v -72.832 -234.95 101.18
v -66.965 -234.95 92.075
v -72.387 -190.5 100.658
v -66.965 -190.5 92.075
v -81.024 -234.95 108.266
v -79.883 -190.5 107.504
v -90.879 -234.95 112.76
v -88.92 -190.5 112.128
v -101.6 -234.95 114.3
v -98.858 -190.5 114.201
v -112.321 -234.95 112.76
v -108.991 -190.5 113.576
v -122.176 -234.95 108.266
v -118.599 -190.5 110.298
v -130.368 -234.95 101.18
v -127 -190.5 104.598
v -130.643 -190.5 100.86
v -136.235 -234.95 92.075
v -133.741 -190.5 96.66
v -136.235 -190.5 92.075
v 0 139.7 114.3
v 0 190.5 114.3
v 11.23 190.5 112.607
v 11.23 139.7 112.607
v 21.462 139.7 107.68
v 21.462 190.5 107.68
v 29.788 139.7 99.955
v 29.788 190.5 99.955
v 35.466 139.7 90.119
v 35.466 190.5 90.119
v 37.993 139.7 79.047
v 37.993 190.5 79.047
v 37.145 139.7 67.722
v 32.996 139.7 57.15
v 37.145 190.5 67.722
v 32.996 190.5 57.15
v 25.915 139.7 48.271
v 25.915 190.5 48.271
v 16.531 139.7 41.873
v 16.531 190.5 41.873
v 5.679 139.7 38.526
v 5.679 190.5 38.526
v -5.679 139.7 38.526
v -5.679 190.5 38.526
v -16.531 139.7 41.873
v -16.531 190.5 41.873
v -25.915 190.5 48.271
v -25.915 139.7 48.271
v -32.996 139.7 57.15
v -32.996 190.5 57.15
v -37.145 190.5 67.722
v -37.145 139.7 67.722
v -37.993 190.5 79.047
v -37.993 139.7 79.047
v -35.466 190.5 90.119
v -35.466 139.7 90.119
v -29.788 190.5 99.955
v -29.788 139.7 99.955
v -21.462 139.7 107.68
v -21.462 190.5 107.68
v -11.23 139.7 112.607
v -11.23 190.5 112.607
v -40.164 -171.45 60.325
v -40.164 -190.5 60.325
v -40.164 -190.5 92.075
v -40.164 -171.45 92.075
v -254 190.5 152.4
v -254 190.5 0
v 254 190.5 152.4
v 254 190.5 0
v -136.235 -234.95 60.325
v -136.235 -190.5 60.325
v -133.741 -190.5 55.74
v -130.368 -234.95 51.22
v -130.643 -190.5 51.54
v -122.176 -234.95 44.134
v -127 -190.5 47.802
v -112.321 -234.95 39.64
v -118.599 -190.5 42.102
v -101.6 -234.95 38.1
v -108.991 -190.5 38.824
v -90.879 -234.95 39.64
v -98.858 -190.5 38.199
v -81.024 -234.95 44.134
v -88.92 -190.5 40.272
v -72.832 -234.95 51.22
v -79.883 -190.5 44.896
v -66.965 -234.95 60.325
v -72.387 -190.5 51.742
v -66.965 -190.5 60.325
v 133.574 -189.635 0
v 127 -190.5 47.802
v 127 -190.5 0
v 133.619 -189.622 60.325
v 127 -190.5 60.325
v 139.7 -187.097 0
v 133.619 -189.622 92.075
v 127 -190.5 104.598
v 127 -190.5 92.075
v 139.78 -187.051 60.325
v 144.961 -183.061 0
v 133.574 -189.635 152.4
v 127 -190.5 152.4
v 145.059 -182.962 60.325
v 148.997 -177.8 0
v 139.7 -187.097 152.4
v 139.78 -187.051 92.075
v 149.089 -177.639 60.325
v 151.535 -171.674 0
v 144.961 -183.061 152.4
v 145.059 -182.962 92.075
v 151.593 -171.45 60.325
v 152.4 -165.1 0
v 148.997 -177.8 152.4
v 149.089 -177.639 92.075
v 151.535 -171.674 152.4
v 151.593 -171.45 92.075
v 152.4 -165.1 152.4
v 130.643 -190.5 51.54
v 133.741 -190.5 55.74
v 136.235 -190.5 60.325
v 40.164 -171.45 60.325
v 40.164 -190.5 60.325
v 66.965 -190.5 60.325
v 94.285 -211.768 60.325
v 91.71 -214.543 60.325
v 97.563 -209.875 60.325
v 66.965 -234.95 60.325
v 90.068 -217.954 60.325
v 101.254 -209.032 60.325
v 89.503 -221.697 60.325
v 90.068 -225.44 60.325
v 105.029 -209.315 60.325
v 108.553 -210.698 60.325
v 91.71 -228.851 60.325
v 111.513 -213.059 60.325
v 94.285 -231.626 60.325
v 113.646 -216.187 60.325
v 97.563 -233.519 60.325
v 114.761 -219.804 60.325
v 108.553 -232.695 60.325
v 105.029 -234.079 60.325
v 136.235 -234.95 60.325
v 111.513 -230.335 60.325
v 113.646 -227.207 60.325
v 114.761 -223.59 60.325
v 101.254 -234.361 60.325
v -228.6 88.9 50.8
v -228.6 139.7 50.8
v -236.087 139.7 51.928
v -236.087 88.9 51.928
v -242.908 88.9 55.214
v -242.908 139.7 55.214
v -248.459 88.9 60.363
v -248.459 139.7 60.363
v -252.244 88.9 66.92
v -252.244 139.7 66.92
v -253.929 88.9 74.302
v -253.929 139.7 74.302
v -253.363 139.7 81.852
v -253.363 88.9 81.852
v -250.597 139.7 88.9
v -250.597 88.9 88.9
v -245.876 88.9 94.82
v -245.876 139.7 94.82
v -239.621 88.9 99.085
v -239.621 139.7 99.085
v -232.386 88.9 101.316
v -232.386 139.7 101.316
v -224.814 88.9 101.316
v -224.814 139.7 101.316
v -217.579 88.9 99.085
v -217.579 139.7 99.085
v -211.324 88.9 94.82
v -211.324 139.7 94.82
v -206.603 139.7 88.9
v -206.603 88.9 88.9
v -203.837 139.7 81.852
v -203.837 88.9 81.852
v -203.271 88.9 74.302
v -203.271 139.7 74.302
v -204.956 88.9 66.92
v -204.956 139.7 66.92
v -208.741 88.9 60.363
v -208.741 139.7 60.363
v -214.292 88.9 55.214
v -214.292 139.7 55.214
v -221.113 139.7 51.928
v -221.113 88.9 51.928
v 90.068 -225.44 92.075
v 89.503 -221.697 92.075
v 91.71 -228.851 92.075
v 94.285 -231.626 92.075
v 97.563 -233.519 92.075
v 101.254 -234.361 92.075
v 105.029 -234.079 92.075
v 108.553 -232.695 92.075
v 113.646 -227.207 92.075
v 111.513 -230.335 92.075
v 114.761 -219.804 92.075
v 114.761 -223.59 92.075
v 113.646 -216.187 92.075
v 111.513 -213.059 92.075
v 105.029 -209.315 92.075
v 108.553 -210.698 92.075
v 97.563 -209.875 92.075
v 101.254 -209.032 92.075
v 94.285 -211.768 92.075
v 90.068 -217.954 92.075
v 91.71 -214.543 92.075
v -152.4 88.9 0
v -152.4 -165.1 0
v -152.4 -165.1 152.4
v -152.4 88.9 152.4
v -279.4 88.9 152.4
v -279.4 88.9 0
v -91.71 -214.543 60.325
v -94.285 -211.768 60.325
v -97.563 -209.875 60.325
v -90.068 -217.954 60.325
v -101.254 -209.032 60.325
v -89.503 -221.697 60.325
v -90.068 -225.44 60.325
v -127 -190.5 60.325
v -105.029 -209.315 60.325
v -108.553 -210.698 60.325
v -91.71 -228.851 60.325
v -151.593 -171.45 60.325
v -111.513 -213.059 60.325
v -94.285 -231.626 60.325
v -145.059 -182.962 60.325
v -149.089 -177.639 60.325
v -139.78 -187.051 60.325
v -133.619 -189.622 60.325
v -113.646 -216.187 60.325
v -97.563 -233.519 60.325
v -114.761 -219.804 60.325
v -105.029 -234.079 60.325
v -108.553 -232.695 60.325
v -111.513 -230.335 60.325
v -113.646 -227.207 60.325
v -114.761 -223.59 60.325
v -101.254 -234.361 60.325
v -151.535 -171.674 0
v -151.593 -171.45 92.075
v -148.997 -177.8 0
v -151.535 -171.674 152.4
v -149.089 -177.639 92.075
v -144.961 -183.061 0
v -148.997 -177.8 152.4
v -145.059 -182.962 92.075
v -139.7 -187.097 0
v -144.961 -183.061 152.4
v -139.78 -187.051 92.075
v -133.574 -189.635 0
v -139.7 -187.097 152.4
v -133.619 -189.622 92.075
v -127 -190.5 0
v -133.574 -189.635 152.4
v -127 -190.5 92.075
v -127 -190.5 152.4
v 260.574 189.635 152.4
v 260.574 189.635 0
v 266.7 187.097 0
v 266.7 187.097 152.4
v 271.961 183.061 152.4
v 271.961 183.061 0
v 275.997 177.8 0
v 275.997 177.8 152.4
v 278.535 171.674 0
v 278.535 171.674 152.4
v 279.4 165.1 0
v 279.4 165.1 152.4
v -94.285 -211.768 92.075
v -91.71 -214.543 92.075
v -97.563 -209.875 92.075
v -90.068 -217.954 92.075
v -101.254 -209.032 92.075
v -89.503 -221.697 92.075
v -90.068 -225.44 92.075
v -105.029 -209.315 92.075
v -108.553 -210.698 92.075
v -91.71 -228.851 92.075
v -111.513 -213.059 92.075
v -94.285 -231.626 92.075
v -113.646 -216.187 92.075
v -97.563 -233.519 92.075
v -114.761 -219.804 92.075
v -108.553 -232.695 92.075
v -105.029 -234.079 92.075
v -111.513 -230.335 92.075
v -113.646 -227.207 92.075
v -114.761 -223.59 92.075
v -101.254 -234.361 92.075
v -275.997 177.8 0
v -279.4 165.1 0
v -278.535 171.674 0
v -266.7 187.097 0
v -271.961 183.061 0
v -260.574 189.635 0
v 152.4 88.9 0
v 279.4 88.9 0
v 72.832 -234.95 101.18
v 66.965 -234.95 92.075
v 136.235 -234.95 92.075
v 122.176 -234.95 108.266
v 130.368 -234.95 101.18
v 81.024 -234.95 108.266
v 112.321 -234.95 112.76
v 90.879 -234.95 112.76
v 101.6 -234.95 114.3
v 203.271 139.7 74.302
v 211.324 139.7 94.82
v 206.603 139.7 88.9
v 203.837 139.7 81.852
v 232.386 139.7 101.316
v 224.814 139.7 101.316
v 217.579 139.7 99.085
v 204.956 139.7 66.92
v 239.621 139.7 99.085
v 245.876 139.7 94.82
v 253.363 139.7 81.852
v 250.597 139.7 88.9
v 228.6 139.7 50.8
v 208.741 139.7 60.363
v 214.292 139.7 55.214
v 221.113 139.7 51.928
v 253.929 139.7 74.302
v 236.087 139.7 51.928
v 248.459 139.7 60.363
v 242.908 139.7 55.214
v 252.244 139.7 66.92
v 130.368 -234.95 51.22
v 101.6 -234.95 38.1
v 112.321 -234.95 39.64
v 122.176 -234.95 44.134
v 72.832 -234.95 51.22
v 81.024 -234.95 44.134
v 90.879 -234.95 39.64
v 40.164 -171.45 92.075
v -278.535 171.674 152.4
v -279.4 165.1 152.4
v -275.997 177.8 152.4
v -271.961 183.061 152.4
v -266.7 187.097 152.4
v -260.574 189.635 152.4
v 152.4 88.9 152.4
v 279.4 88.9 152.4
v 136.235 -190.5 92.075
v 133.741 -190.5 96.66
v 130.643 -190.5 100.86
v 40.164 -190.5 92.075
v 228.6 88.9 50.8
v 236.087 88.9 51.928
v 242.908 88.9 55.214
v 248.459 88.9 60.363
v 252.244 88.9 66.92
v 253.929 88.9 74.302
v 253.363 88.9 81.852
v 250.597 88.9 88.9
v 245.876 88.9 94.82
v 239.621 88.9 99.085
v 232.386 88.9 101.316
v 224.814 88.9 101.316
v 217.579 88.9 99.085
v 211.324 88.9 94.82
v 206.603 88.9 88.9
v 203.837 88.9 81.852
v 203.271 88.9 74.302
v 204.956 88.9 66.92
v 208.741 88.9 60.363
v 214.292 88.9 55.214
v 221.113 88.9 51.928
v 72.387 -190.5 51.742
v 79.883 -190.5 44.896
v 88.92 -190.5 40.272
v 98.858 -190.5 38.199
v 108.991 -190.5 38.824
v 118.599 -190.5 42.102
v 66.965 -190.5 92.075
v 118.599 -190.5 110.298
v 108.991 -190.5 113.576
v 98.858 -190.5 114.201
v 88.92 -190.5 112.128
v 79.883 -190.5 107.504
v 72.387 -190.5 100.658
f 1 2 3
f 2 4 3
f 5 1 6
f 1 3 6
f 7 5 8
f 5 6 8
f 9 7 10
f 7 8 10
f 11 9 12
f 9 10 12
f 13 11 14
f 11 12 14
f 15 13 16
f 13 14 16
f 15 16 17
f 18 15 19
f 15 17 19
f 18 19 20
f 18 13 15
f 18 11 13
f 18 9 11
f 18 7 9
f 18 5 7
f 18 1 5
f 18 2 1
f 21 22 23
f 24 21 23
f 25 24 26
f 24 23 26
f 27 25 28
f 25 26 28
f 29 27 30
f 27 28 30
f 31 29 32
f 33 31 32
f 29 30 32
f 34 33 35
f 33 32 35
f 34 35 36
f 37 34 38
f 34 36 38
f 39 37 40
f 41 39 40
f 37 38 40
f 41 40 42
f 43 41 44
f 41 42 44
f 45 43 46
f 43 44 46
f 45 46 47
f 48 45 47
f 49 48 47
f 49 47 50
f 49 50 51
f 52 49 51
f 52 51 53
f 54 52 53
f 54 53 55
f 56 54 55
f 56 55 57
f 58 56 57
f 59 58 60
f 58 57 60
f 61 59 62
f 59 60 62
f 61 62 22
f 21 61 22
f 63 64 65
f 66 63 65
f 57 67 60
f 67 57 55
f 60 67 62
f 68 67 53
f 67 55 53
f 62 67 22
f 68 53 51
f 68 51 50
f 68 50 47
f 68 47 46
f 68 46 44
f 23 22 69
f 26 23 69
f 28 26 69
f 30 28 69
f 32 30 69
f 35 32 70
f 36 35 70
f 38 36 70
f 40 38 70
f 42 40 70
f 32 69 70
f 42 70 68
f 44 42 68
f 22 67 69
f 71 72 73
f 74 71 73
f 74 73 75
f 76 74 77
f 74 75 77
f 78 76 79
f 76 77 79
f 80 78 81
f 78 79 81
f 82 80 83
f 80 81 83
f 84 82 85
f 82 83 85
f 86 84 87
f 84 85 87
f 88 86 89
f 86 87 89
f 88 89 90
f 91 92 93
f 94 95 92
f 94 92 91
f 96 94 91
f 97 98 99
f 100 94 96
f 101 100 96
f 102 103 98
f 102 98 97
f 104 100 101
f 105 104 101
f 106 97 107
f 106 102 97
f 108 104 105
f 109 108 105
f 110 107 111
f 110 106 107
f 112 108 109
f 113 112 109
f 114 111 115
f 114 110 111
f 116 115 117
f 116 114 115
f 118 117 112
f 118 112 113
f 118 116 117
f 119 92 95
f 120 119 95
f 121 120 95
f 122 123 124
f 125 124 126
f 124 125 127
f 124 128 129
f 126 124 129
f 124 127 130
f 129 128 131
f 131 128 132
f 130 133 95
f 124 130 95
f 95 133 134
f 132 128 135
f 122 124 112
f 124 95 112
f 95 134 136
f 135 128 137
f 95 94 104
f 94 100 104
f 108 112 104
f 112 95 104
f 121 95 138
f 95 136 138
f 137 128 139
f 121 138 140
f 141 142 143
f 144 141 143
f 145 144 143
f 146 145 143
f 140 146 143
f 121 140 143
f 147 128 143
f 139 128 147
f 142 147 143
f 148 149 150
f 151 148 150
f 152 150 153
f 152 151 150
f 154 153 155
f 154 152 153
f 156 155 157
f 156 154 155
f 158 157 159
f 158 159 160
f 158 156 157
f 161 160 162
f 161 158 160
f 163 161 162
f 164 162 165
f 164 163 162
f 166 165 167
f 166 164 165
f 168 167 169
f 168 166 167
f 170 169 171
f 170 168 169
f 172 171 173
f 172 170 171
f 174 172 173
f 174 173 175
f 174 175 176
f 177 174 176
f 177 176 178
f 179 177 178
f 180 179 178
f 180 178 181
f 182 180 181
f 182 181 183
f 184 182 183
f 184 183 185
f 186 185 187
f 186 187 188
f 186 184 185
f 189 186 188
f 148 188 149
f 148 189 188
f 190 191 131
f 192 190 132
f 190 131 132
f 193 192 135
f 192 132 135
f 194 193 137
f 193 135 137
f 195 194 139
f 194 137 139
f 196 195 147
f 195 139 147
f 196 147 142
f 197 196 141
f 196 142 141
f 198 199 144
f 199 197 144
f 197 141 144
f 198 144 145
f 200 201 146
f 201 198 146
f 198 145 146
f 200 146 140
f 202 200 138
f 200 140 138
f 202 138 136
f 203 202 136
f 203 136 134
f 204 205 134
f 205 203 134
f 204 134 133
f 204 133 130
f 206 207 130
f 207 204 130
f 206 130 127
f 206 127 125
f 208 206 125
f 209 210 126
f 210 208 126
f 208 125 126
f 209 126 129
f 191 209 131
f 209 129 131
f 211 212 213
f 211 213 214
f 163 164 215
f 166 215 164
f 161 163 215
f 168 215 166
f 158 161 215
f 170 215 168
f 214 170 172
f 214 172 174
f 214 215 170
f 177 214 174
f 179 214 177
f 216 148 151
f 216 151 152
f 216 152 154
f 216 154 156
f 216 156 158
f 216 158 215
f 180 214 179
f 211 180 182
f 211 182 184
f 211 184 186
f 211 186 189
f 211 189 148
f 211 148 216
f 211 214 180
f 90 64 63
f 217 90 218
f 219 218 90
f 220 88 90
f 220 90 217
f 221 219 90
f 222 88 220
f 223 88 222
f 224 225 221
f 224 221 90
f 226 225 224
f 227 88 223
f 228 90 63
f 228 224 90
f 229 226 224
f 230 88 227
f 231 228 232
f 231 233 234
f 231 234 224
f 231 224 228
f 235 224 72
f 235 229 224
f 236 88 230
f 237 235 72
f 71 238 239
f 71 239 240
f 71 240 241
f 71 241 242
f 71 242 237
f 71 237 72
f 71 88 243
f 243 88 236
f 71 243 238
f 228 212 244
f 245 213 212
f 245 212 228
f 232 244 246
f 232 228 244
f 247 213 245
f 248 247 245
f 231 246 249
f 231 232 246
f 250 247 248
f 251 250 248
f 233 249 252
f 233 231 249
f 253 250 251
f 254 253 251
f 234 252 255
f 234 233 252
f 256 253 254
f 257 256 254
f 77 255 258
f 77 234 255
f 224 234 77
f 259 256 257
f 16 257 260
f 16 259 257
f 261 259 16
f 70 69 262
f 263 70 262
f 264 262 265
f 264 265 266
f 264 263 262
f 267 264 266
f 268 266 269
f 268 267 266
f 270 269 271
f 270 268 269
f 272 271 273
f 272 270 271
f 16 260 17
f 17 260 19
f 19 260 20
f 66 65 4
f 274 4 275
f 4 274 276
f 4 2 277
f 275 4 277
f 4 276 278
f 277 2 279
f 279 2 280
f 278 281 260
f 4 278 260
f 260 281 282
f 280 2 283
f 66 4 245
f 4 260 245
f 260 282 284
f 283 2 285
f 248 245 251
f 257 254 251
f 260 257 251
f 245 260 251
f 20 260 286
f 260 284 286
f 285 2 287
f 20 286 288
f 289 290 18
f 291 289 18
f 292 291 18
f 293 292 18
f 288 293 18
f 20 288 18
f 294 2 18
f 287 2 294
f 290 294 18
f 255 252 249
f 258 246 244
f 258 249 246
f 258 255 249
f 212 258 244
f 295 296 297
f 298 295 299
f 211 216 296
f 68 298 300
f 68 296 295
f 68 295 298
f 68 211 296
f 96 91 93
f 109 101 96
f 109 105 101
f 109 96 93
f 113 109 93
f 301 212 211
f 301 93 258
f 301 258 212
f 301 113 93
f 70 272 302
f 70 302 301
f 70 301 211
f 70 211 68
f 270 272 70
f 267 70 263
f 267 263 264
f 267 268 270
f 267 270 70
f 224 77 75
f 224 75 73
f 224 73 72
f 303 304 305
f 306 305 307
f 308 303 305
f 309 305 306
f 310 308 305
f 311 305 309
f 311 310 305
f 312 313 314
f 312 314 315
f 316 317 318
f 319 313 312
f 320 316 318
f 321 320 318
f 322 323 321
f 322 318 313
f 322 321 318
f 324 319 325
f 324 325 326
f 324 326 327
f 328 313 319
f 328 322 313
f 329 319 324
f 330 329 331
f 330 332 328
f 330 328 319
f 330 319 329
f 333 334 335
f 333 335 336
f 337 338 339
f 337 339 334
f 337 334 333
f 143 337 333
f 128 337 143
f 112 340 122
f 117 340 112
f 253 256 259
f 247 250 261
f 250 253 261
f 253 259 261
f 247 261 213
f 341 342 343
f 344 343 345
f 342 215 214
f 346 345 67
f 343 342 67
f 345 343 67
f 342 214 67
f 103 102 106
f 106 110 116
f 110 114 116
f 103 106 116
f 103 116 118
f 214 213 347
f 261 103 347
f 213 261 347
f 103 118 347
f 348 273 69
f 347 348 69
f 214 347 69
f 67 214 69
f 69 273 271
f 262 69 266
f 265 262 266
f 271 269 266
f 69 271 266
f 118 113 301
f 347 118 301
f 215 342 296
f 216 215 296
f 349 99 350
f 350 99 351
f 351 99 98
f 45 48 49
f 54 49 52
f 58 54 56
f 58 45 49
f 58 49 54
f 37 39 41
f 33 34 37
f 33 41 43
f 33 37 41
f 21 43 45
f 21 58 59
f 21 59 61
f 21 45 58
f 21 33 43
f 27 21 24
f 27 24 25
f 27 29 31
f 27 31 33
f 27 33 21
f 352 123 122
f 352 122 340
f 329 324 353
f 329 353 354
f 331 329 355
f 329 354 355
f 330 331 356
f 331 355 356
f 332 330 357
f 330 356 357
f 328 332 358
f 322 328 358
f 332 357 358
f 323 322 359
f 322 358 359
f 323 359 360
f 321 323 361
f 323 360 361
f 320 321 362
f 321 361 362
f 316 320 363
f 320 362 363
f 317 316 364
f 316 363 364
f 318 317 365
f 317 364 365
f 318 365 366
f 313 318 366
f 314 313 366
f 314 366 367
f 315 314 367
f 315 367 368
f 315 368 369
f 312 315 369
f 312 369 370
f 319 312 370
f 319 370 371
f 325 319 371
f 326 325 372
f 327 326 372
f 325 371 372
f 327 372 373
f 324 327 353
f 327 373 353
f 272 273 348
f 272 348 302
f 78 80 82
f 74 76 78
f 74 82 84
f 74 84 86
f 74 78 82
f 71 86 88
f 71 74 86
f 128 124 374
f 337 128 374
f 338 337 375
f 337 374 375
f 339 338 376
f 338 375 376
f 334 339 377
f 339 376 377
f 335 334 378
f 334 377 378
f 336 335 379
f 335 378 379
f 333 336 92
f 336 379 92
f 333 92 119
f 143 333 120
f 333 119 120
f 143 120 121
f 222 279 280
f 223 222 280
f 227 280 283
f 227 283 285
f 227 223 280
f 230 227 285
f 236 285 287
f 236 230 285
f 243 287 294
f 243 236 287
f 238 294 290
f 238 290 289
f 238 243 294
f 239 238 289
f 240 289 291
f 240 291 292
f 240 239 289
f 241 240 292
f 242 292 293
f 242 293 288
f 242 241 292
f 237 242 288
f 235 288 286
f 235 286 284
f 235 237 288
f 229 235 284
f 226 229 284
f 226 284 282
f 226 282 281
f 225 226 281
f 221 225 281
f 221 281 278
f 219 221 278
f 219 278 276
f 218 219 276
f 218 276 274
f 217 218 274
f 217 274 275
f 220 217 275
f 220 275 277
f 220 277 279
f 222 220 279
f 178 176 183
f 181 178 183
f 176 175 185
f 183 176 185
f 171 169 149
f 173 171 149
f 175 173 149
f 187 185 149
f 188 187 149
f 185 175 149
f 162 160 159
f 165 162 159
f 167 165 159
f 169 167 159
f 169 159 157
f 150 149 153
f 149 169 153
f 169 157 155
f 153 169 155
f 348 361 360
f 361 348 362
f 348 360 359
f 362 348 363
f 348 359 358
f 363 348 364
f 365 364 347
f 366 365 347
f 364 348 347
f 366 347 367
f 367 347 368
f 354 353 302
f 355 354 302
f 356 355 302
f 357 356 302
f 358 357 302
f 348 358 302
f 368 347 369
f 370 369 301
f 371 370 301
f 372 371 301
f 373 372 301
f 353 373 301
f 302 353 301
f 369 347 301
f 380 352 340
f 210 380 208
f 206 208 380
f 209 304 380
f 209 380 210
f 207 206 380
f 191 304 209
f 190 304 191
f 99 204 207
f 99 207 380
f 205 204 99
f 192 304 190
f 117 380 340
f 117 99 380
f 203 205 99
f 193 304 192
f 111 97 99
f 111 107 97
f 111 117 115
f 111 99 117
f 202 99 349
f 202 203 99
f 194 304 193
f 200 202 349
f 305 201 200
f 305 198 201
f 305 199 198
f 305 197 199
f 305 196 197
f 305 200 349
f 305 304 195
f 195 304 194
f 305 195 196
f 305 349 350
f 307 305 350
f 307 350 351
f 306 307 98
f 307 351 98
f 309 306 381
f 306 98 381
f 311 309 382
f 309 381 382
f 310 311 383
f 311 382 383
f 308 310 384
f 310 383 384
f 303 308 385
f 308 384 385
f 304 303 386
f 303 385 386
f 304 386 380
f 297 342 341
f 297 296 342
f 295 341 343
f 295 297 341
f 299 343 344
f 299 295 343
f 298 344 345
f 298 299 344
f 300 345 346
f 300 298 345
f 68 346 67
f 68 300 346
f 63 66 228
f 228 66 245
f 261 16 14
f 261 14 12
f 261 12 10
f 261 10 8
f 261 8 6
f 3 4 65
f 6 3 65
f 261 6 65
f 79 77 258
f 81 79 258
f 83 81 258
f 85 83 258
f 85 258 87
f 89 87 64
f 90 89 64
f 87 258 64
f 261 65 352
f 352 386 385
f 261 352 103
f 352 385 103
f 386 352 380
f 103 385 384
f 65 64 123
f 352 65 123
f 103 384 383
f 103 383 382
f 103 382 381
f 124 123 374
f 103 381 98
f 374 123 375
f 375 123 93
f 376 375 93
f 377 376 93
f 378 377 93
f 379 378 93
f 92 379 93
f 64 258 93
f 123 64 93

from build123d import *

# Parameters (mm, degrees)
SKETCH1_W           = 304.8
SKETCH1_H           = 381
BOSS_EXTRUDE1_DEPTH = 152.4
SKETCH2_R           = 38.1
CUT_EXTRUDE1_DEPTH  = 50.8
SKETCH5_W           = 152.4
SKETCH5_H           = 101.6
BOSS_EXTRUDE3_DEPTH = 127
SKETCH6_R           = 25.4
CUT_EXTRUDE4_DEPTH  = 50.8
FILLET4_R           = 25.4
FILLET5_R           = 25.4
SKETCH3_R           = 38.1
BOSS_EXTRUDE4_DEPTH = 44.45
SKETCH8_W           = 122.871403684
SKETCH8_H           = 31.75
CUT_EXTRUDE5_DEPTH  = 63.5
SKETCH9_R           = 12.7
BOSS_EXTRUDE5_DEPTH = 32.766


with BuildPart() as part:
    # Sketch1 → Boss-Extrude1 (new body)
    with BuildSketch(Plane.XY):
        Rectangle(SKETCH1_W, SKETCH1_H)
    extrude(amount=BOSS_EXTRUDE1_DEPTH)

    # Sketch2 → Cut-Extrude1 (cut)
    with BuildSketch(Plane(origin=(0, 190.5, 0), x_dir=(1, 0, 0), z_dir=(0, 1, 0))):
        with Locations(Location((0, -76.2, 0), (0, 0, 270))):
            Circle(SKETCH2_R)
    extrude(amount=-CUT_EXTRUDE1_DEPTH, mode=Mode.SUBTRACT)

    # Sketch5 → Boss-Extrude3 (add)
    with BuildSketch(Plane(origin=(152.4, 0, 0), x_dir=(0, 0, -1), z_dir=(1, 0, 0))):
        with Locations((-76.2, 139.7)):
            Rectangle(SKETCH5_W, SKETCH5_H)
    boss_extrude3 = extrude(amount=BOSS_EXTRUDE3_DEPTH)

    # Mirror1: Boss-Extrude3 across plane
    add(boss_extrude3.mirror(Plane(origin=(0, 0, 0), x_dir=(0, 0, 1), z_dir=(1, 0, 0))))

    # Sketch6 → Cut-Extrude4 (cut)
    with BuildSketch(Plane.XZ.offset(-88.9)):
        with Locations(Location((228.6, 76.2, 0), (0, 0, 270))):
            Circle(SKETCH6_R)
    cut_extrude4 = extrude(amount=-CUT_EXTRUDE4_DEPTH, mode=Mode.SUBTRACT)

    # Fillet4
    fillet4_edges = [part.edges().sort_by_distance(p)[0] for p in [
        (279.4, 190.5, 76.2),
        (-279.4, 190.5, 76.2),
    ]]
    fillet(fillet4_edges, radius=FILLET4_R)

    # Fillet5
    fillet5_edges = [part.edges().sort_by_distance(p)[0] for p in [
        (-152.4, -190.5, 76.2),
        (152.4, -190.5, 76.2),
    ]]
    fillet(fillet5_edges, radius=FILLET5_R)

    # Mirror2: Cut-Extrude4 across plane
    add(cut_extrude4.mirror(Plane(origin=(0, 0, 0), x_dir=(0, 0, 1), z_dir=(1, 0, 0))), mode=Mode.SUBTRACT)

    # Sketch3 → Boss-Extrude4 (add)
    with BuildSketch(Plane.XZ.offset(190.5)):
        with Locations(Location((-101.6, 76.2, 0), (0, 0, 131.810314896))):
            Circle(SKETCH3_R)
        with Locations(Location((101.6, 76.2, 0), (0, 0, 48.189685104))):
            Circle(SKETCH3_R)
    extrude(amount=BOSS_EXTRUDE4_DEPTH)

    # Sketch8 → Cut-Extrude5 (cut)
    with BuildSketch(Plane.XZ.offset(234.95)):
        with Locations((101.6, 76.2)):
            Rectangle(SKETCH8_W, SKETCH8_H)
    cut_extrude5 = extrude(amount=-CUT_EXTRUDE5_DEPTH, mode=Mode.SUBTRACT)

    # Mirror3: Cut-Extrude5 across plane
    add(cut_extrude5.mirror(Plane(origin=(0, 0, 0), x_dir=(0, 0, 1), z_dir=(1, 0, 0))), mode=Mode.SUBTRACT)

    # Sketch9 → Boss-Extrude5 (add)
    with BuildSketch(Plane.XY.offset(60.325)):
        with Locations(Location((102.203286199, -221.696968448, 0), (0, 0, 180))):
            Circle(SKETCH9_R)
    boss_extrude5 = extrude(amount=BOSS_EXTRUDE5_DEPTH)

    # Mirror4: Boss-Extrude5 across plane
    add(boss_extrude5.mirror(Plane(origin=(0, 0, 0), x_dir=(0, 0, 1), z_dir=(1, 0, 0))))


solid = part.part
